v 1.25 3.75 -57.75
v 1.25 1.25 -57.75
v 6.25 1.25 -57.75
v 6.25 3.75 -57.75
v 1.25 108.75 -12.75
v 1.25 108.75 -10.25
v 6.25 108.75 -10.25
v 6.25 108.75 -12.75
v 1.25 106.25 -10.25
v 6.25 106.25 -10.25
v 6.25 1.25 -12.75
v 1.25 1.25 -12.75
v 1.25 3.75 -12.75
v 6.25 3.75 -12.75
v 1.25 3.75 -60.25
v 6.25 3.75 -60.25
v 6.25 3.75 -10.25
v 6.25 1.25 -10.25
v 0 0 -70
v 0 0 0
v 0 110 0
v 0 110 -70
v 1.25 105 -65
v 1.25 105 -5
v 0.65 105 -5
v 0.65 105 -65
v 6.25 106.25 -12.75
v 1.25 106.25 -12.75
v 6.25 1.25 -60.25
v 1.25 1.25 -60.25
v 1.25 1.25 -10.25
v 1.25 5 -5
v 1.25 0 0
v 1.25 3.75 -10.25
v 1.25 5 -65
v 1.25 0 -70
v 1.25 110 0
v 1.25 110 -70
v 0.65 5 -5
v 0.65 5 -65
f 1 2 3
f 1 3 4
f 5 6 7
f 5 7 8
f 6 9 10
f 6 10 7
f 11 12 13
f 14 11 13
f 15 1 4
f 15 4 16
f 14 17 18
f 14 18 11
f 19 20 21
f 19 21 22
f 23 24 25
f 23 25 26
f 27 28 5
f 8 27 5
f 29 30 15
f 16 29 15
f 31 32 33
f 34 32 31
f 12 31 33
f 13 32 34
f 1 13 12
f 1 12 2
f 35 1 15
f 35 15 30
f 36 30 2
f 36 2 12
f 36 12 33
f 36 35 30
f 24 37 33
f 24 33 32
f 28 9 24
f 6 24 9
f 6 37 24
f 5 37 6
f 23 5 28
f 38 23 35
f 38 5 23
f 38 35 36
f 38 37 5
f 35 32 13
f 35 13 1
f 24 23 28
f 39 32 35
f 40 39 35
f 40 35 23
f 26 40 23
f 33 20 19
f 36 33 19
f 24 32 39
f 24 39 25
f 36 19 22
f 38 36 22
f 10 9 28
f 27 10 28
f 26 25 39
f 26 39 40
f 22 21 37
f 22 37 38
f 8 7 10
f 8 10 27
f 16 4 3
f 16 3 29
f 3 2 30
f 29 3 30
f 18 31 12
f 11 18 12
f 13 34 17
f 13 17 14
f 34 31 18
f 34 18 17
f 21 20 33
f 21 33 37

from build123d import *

# Parameters (mm, degrees)
SKETCH1_W           = 70
SKETCH1_H           = 110
BOSS_EXTRUDE1_DEPTH = 1.25
SKETCH2_W           = 2.5
SKETCH2_H           = 2.5
BOSS_EXTRUDE2_DEPTH = 5
SKETCH3_W           = 60
SKETCH3_H           = 100
CUT_EXTRUDE1_DEPTH  = 0.6


with BuildPart() as part:
    # Sketch1 → Boss-Extrude1 (new body)
    with BuildSketch(Plane(origin=(0, 0, 0), x_dir=(0, 0, -1), z_dir=(1, 0, 0))):
        with Locations((35, 55)):
            Rectangle(SKETCH1_W, SKETCH1_H)
    extrude(amount=BOSS_EXTRUDE1_DEPTH)

    # Sketch2 → Boss-Extrude2 (add)
    with BuildSketch(Plane(origin=(1.25, 0, 0), x_dir=(0, 0, -1), z_dir=(1, 0, 0))):
        with Locations((11.5, 107.5)):
            Rectangle(SKETCH2_W, SKETCH2_H)
        with Locations((11.5, 2.5)):
            Rectangle(SKETCH2_W, SKETCH2_H)
        with Locations((59, 2.5)):
            Rectangle(SKETCH2_W, SKETCH2_H)
    extrude(amount=BOSS_EXTRUDE2_DEPTH)

    # Sketch3 → Cut-Extrude1 (cut)
    with BuildSketch(Plane(origin=(1.25, 0, 0), x_dir=(0, 0, -1), z_dir=(1, 0, 0))):
        with Locations((35, 55)):
            Rectangle(SKETCH3_W, SKETCH3_H)
    extrude(amount=-CUT_EXTRUDE1_DEPTH, mode=Mode.SUBTRACT)


solid = part.part
